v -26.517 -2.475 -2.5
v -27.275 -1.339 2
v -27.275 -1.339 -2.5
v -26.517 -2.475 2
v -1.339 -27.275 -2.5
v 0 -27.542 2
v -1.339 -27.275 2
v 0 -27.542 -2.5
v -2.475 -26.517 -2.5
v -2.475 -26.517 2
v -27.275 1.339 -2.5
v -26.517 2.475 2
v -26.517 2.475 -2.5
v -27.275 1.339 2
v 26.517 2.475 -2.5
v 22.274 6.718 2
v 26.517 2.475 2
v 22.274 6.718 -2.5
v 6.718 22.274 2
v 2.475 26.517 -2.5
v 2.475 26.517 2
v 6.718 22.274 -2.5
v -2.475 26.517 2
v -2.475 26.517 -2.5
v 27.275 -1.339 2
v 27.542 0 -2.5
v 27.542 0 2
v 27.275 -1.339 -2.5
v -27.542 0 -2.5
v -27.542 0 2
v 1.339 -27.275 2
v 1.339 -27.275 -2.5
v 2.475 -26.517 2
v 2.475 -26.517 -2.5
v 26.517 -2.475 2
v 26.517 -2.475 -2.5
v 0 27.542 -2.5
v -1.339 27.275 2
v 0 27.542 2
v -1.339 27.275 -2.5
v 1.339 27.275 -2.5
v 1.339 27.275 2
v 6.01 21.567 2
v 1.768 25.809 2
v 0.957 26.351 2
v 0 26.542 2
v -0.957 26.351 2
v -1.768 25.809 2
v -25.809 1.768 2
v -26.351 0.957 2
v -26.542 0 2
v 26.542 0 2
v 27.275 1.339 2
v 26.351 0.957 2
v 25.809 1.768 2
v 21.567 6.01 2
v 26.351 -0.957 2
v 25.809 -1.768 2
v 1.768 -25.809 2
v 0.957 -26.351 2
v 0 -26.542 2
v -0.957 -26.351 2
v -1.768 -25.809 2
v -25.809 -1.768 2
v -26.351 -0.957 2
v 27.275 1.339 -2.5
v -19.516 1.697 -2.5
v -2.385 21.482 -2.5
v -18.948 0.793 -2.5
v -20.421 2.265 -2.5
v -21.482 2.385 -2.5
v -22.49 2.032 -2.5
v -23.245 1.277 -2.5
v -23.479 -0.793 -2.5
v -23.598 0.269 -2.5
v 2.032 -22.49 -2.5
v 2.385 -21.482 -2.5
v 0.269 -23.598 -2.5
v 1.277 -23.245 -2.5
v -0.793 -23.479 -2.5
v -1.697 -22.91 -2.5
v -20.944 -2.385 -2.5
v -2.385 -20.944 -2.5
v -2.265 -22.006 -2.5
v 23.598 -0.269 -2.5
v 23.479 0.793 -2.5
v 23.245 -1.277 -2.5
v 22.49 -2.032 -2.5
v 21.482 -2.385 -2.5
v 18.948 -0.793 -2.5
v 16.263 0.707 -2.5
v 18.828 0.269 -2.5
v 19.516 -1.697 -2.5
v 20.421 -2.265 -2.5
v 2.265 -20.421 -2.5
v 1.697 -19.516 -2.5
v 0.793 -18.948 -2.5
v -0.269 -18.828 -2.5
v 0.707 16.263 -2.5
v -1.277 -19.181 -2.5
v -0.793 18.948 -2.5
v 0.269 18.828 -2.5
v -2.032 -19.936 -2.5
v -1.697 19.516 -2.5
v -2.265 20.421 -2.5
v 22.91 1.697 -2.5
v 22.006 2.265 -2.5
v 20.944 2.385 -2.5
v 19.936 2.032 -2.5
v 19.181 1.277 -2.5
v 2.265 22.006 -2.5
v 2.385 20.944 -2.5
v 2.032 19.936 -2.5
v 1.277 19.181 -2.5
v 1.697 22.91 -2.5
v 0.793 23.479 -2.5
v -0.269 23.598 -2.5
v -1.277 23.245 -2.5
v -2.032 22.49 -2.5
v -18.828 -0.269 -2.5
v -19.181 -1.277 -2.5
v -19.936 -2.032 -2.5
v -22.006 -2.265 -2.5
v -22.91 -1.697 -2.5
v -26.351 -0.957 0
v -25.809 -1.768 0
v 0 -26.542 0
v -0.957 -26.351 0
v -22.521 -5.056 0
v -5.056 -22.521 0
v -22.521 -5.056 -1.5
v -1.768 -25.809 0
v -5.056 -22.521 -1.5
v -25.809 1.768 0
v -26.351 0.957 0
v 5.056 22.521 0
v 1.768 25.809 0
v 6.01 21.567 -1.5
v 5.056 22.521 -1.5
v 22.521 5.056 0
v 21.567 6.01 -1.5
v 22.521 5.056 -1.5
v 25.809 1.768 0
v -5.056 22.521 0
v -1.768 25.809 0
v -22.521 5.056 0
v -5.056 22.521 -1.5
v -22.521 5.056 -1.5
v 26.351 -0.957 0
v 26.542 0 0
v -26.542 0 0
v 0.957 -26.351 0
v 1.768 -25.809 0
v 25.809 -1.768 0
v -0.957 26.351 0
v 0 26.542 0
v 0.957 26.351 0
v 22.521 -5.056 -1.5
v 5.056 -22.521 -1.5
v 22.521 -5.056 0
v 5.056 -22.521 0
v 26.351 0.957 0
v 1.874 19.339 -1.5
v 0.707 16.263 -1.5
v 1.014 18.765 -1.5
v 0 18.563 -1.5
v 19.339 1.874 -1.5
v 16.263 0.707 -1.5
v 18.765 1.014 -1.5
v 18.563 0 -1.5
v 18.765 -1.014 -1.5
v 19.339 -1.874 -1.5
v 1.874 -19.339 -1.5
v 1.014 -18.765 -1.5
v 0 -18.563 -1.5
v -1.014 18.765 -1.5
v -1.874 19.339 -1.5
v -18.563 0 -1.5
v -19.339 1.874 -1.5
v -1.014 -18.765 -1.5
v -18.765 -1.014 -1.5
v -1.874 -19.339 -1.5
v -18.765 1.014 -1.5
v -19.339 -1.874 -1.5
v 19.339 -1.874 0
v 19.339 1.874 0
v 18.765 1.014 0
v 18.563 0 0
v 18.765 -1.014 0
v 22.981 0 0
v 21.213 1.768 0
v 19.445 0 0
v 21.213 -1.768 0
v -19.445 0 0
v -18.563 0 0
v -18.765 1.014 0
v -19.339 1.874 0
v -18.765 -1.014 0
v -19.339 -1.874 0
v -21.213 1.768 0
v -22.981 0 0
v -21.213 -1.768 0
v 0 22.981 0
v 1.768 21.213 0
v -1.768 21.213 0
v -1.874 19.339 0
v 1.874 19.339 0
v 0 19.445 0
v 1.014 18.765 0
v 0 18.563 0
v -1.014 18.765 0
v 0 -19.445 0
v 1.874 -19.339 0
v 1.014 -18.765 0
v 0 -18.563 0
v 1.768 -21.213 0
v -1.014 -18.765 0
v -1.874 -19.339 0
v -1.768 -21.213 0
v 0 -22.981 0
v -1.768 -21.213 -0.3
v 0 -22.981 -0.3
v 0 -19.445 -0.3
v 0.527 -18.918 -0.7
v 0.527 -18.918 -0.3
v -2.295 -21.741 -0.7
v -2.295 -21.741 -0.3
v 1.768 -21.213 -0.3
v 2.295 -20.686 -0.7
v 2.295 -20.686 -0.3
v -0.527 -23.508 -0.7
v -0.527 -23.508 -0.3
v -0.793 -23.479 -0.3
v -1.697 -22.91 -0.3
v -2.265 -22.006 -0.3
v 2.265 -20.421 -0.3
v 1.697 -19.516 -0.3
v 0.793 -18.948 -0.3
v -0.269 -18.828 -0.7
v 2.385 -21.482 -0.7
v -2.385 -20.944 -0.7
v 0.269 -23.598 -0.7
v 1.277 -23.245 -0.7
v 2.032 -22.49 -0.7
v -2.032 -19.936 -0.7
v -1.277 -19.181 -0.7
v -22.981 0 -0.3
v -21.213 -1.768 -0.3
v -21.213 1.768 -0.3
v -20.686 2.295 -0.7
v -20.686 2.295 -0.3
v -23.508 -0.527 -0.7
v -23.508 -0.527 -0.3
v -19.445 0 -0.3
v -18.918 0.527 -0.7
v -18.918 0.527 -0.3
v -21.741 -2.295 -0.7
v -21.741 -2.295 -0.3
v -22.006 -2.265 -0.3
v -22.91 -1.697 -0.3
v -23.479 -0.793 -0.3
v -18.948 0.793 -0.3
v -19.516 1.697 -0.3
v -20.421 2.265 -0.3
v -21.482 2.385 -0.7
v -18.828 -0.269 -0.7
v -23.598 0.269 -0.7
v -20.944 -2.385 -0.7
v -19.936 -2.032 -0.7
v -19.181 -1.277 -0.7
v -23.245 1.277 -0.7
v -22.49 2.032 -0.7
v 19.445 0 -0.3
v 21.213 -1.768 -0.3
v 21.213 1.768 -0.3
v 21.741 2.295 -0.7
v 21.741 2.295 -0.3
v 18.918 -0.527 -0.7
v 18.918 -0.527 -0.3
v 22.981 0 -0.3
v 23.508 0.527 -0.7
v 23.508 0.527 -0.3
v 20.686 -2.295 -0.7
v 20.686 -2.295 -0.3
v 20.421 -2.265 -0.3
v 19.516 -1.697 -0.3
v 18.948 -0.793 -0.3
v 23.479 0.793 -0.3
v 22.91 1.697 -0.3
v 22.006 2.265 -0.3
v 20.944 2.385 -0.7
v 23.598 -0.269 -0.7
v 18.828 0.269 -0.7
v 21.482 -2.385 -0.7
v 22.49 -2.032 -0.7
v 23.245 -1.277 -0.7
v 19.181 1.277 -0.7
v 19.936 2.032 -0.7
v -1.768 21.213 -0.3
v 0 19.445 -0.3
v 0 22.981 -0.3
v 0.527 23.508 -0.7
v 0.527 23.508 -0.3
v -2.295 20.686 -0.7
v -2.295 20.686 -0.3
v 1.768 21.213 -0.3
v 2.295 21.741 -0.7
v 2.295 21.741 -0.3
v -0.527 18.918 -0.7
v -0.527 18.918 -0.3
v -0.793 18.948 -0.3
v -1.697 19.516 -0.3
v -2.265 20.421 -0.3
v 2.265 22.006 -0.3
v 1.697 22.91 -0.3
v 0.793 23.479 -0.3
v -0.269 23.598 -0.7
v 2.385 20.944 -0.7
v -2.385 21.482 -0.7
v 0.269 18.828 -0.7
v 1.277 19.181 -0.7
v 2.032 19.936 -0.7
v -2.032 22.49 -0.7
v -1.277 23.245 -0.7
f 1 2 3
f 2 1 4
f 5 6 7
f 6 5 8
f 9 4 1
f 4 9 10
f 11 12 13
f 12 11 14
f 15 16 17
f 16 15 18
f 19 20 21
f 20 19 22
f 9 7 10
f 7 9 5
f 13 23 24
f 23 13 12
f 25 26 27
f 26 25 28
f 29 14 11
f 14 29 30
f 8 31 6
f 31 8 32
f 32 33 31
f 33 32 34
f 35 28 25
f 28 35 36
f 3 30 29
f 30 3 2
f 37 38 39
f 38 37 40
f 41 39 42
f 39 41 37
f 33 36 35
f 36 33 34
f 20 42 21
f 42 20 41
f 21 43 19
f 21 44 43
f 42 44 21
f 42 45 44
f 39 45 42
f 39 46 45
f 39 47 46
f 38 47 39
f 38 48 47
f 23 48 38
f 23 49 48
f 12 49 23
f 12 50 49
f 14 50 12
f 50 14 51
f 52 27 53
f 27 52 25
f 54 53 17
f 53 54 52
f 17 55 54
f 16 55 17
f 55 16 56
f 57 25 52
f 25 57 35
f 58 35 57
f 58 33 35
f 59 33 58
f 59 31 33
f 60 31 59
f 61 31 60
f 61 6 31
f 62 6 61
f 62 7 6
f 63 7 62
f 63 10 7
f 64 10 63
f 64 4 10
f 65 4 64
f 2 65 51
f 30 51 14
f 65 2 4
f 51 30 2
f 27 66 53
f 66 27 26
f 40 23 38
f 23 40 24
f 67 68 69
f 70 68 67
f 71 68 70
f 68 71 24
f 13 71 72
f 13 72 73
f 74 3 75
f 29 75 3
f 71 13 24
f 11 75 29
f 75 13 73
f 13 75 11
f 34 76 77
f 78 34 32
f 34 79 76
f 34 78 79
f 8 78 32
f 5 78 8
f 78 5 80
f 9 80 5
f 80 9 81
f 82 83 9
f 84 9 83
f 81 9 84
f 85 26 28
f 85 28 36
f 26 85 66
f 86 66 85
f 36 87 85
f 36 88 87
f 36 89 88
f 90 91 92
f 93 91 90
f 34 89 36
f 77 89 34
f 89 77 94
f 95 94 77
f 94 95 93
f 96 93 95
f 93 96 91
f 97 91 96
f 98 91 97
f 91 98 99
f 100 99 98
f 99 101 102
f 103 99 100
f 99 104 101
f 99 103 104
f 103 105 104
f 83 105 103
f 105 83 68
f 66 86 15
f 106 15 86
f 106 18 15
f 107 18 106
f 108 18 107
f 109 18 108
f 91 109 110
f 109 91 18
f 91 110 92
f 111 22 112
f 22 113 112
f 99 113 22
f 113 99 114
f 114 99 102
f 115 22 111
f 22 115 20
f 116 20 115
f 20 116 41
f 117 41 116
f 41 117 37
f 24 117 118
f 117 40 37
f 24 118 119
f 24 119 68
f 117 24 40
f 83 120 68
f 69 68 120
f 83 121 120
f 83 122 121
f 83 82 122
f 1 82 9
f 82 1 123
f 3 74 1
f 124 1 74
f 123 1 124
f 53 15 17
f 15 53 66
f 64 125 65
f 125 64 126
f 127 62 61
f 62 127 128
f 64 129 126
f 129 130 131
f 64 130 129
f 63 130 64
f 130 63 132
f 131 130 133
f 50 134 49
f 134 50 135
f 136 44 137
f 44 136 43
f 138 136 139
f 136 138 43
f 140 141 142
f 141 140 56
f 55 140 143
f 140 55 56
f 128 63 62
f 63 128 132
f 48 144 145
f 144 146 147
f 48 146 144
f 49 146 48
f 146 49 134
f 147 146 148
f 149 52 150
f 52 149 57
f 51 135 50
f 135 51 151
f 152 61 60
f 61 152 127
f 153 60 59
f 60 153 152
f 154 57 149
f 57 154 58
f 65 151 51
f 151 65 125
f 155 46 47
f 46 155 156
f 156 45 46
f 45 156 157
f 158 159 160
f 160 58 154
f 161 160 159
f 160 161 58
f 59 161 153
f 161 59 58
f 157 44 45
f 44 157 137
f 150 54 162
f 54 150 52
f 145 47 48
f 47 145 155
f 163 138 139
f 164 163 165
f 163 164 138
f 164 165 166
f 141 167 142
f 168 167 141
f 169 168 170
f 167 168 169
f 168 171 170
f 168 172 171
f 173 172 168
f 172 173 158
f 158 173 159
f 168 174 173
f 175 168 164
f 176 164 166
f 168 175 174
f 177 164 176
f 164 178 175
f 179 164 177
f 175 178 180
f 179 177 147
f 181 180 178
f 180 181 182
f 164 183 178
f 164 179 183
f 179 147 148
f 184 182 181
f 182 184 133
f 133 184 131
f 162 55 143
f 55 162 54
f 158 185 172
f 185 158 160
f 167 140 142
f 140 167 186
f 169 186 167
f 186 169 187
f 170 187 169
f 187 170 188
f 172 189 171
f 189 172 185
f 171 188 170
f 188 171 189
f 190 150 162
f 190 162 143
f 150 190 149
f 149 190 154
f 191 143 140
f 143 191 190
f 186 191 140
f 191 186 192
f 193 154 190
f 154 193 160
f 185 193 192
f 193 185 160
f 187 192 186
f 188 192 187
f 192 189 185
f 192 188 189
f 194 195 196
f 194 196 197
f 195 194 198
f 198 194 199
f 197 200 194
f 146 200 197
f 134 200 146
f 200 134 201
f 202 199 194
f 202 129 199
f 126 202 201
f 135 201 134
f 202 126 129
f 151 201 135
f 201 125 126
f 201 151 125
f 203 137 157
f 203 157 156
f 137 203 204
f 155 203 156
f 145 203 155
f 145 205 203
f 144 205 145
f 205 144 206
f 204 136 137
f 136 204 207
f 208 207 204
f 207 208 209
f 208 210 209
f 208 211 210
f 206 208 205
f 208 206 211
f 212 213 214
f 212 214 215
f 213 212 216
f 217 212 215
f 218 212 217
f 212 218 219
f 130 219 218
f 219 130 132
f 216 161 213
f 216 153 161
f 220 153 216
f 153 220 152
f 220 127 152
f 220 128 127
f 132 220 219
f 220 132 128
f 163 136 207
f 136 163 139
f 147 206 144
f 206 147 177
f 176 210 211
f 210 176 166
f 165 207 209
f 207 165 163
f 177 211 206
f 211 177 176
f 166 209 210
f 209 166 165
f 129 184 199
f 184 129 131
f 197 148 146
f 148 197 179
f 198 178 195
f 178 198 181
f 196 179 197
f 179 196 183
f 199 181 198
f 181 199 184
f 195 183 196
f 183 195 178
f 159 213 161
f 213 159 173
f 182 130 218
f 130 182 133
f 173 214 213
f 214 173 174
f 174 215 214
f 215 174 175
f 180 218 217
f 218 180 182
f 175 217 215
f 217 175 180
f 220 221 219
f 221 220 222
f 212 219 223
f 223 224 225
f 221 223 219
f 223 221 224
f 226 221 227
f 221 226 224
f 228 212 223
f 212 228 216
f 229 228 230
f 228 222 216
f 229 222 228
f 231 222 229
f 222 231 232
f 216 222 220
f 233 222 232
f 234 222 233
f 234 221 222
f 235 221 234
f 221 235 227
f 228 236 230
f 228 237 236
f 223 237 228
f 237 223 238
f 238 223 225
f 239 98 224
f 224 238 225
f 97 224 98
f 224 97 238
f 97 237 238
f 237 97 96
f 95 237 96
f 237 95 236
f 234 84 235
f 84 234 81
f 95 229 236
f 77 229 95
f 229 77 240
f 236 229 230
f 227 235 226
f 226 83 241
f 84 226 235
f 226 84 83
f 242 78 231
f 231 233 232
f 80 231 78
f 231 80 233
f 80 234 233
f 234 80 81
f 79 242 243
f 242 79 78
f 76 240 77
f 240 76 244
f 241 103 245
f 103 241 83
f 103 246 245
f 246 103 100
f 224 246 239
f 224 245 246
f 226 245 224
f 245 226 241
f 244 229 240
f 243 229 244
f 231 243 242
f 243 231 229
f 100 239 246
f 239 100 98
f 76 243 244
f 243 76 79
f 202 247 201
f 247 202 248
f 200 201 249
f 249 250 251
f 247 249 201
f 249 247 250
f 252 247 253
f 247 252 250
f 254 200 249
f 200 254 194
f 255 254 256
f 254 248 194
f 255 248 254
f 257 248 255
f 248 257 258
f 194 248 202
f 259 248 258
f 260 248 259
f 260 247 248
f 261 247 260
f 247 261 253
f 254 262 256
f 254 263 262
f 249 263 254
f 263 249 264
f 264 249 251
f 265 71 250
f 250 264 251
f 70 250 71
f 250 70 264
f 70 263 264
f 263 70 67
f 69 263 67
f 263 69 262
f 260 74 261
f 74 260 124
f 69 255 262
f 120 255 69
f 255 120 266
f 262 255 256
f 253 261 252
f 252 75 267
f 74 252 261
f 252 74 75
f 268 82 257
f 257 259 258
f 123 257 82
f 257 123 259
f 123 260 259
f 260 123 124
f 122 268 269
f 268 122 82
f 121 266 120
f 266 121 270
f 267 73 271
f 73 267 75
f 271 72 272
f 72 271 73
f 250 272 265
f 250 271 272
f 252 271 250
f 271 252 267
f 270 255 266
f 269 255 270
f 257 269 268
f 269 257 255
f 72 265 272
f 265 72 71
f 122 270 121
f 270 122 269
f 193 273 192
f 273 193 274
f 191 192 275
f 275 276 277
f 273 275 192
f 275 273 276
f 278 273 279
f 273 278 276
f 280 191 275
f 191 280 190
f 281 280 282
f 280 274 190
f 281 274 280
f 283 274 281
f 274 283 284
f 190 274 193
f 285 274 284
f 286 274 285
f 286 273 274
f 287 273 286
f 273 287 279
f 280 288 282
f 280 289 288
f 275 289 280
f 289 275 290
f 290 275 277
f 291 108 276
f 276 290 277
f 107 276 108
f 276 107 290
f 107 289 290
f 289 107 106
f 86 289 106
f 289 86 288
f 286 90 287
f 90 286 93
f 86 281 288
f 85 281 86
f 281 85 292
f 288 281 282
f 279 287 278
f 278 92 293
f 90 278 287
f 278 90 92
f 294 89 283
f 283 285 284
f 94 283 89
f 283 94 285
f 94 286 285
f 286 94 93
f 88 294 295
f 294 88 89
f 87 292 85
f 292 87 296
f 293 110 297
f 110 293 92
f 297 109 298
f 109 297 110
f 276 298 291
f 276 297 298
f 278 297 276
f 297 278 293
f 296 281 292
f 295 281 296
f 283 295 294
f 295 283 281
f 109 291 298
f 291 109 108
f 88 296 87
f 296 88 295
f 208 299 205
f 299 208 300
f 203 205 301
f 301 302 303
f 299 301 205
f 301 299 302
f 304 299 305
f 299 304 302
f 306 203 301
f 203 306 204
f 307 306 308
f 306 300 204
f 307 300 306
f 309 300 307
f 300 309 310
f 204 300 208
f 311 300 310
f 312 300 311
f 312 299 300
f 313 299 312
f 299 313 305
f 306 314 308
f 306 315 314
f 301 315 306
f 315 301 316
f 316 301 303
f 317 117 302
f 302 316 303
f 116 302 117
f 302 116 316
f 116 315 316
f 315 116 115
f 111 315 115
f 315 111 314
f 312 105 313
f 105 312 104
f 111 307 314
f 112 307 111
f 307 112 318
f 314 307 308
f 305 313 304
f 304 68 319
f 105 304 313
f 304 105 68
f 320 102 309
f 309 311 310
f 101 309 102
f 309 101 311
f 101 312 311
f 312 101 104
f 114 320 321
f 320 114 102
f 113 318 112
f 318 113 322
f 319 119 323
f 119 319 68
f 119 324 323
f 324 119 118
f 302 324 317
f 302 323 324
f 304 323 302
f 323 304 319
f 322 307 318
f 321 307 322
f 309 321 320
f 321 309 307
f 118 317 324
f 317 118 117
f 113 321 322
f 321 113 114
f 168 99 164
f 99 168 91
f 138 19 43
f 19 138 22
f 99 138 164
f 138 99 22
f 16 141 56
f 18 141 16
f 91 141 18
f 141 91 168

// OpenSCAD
// file: libs/libdict.scad
// This library add dictionary like features to openscad
// the dictionary is a list of pairs as we cannot define new types.
// Unlike a python dictionary we cannot do a proper hash table for speed
// so everything is build around the OpenSCAD search function
// There are a lot of assert statements to ensure data in the "dictionary"
// is in the format of
// * A list of lists
// * Each internal list has a length of two
// * First element of each internal list is a string (the key)
// * All keys are unique.


// Private function:
// This function returns true if the value is in the list
// value must be a string.
// No error checking, for use by is_in only!
function _is_in_str(value, list) =
    search([value], list) != [[]];

// Private function:
// This function returns true if the value is in the list
// value must be a number.
// No error checking, for use by is_in only!
function _is_in_num(value, list) =
    search(value, list) != [];


// This function returns true if the value is in the list
// value must be a string or a number.
function is_in(value, list) =
    assert(is_num(value) || is_string(value) , "is_in: value must be a number or string")
    assert(is_list(list), "is_in: list must be a list")
    is_num(value) ? _is_in_num(value, list) : _is_in_str(value, list);

/**
 * Sum a list
 * This recursive function sums a list.  It should be called with one
 * argument (the list); the other two arguments simply allow it to be
 * "tail-recursive" which lets OpenSCAD optimise it better.  This is
 * very close to the example given in the OpenSCAD docs.
 */
function _libdict_sum_list(list, starting_element=0, running_total=0) =
    starting_element >= len(list) ?
        running_total :
        _libdict_sum_list(list, starting_element + 1, running_total + list[starting_element]);

/**
 * When checking a list for uniqueness, we can get "errant matches".
 * An errant match is when a non-list matches with the first element in a list.
 * i.e. it would consider [1, [1,0]] to be non-unique. We cannot know which 
 * element is the non-list but we do know that it is errant if exactly one 
 * of them is not a list.
 * If two elements are non-lists, they must be identical in order to have matched.  
 * Similarly, if all elements are lists, they must be identical because ``search`` 
 * will have matched them as whole lists.
 * The argument "list" is the list we are checking for uniqueness, and "match" is 
 * a vector of indices that have been returned by ``search``.
 */
function _check_errant_match(list, match) = let(
    non_list = [for (m = match) is_list(list[m])? 0 : 1],
    number_of_non_lists = _libdict_sum_list(non_list)
) number_of_non_lists == 1 ? 0 : 1;

// Returns true if all emements in list are unique.
function is_unique(list) =
    assert(is_list(list), "is_unique: list must be a list")
    let(
        matches = search(list, list, 0),
        // Assign 1 or 0 depending on is the match length for each element
        // return wether any matches are greater than one (mathcing more than
        // itself)
        // note cannot search for true or false so using 1 and zero
        bool_list = [for (match = matches) if (len(match)==1) 0
            // should put a 1 here to show they matched but in the case of
            // [1, [1]] it will match both, so need to check if they are
            // both lists or both not list
            else _check_errant_match(list, match)]
    ) !is_in(1, bool_list);

// Private function:
// Checks that the input is a list and that every element is a list
// of length 2.
// No error checking, for use by valid_dict only!
function _is_pairs(list) =
    !is_list(list) ? false :
        !is_in(0, [for (pair = list) is_list(pair) && len(pair)==2 ? 1: 0]);

// Private function:
// Checks all elements in the list are strings
// No error checking, for use by valid_dict only!
// Strings can't be empty
function _is_list_of_strings(list) =
    !is_in(0, [for (item = list) is_string(item) && len(item)>0 ? 1: 0]);

// Private function:
// Returns the keus in a dictionary
// No error checking, for use by valid_dict only!
function _keylist(dict)  = [for (pair=dict) pair[0]];

function valid_dict(dict) =
    //if the input are not pairs return instantly
    !_is_pairs(dict) ? false : let (
        //if they are pairs get all keys
        keys = _keylist(dict),
        all_strings =  _is_list_of_strings(keys),
        unique = is_unique(keys)
    ) (all_strings && unique) ? true : false;

// Key lookup for key value pair "dictionary".
// Unlike the built in lookup this works with strings.
function key_lookup(key, dict) =
    assert(is_string(key), "`key` must be a string")
    assert(valid_dict(dict), "`dict` must be a valid 'dictionary'")
    let(
        // key is in [] because otherwise openscad will search for each letter rather than the string.
        index = search([key], dict, 1, 0)[0]
    )  assert (index!=[], "Key lookup failed, key not found!") dict[index][1];

// Creates a new dictionary with a key value pair replaced. Pair must already
// be in dictionary.
function replace_value(key, value, dict) =
    assert(is_string(key), "`key` must be a string")
    assert(valid_dict(dict), "`dict` must be a valid 'dictionary'")
    assert(is_in(key, _keylist(dict)), "`key` not found in dictionary!")
    [for (kv_pair = dict) key!=kv_pair[0] ? kv_pair : [key, value]];


// Creates a new dictionary with a a set of key value pair replaced
// both inputs must be a dictionary. All keys in input must already be
// in dictionary
function replace_multiple_values(rep_dict, dict) =
    assert(valid_dict(rep_dict), "`rep dict` must be a valid 'dictionary'")
    assert(valid_dict(dict), "`dict` must be a valid 'dictionary'")
    let(
        // loop over all keys in replacement dict checking they are in the original
        rep_keys = [for (key = _keylist(rep_dict))
            assert(is_in(key, _keylist(dict)), "`key` not found in dictionary!")
            key
        ]
    ) //Finally return the updated dictionary using this long list comprehension.
    [
        for (kv_pair = dict) let(
            key = kv_pair[0],
            // check if this key is in the replacement dictionary and if so return index
            // key is in [] because otherwise openscad will search for each letter rather
            // than the string.
            index = search([key], rep_dict, 1, 0)[0]
            // if index is empty return original key value pair, else return the key with
            // the replaced value
        ) index == [] ? kv_pair : [key, rep_dict[index][1]]
    ];
// file: libs/cameras/picamera_hq.scad
use <../utilities.scad>
use <../libdict.scad>

function picamera_hq_camera_dict() = [["mount_height", 4.5],
                                     ["sensor_height", 1]]; //Height of the sensor above the PCB

function picamera_hq_bottom_z() = -key_lookup("mount_height", picamera_hq_camera_dict());

function picamera_hq_hole_spacing() = 30;

function picamera_board_size() = [38, 38];

module picamera_hq_cutout(beam_length=15){
    h = key_lookup("mount_height", picamera_hq_camera_dict())+tiny();
    translate_z(-tiny()){
        cylinder(d=5, h=beam_length);
        cylinder(d1=9.5+2*h, d2=9.5, h=h);
    }
}

module picamera_hq_board(h=tiny(), rotated=true, clearance=0){
    // a rounded rectangle with the dimensions of the picamera hq board
    // centred on the origin
    board_dims = picamera_board_size();
    roc = 2+clearance;
    angle = rotated ? 45 : 0;
    rotate_z(angle){
        linear_extrude(h){
            hull(){
                reflect([1,0]){
                    reflect([0,1]){
                        translation = board_dims/2 + [1, 1]*(-roc+clearance);
                        translate(translation){
                            circle(r=roc,$fn=16);
                        }
                    }
                }
            }
        }
    }
}

module picamera_hq_camera_mount(screwhole=true, counterbore=false){
    // A mount for the pi camera hq
    // This should finish at z=0+tiny(), with a surface that can be
    // hull-ed onto the lens assembly.
    board_dims = picamera_board_size();
    difference(){
        rotate(45){
            sequential_hull(){
                translate_z(picamera_hq_bottom_z()){
                    picamera_hq_board(h=tiny(), rotated=false);
                }
                translate_z(-1){
                    picamera_hq_board(h=tiny(), rotated=false);
                }
                x_size = board_dims.x-(-1.5-picamera_hq_bottom_z())*2;
                cube([x_size, board_dims.y, tiny()], center=true);
            }
        }
        rotate(45){
            translate_z(picamera_hq_bottom_z()){
                picamera_hq_cutout();
            }
        }
        if(counterbore){
            picamera_hq_counterbore();
        }
        if(screwhole){
            picamera_hq_screwholes();
        }
    }
}

module picamera_hq_screwholes(){
    //chamfered screw holes for mounting
    translate_z(picamera_hq_bottom_z()){
        at_picamera_hq_hole_pattern(){
            rotate_z(60){
                translate_z(-tiny()){
                    no2_selftap_hole(h=10);
                }
            }
        }
    }
}

module picamera_hq_counterbore(){
    translate_z(picamera_hq_bottom_z()-1){
        at_picamera_hq_hole_pattern(){
            cylinder(r=1.25, h=99, $fn=12);
        }
    }
    translate_z(picamera_hq_bottom_z()+1){
        at_picamera_hq_hole_pattern(){
            cylinder(r=2.8, h=99, $fn=12);
        }
    }
}

module picamera_hq_bottom_mounting_posts(optics_config, outers=true, cutouts=true, bottom_slice=false){
    // posts to mount to pi camera from below

    if (bottom_slice){
        //if we want the bottom slice intersect with the bottom of the whole
        //post found by recalling the function
        intersection(){
            cylinder(h=tiny(), r=99);
            picamera_hq_bottom_mounting_posts(optics_config, outers=outers, cutouts=cutouts);
        }
    }
    else{
        h=key_lookup("mounting_post_height", optics_config);
        r1=3;
        r2=2;
        at_picamera_hq_hole_pattern(){
            difference(){
                if(outers){
                    cylinder(r1=r1, r2=r2, h=h, $fn=12);
                }
                if(cutouts){
                    translate_z(h-6+tiny()){
                        no2_selftap_hole(h=6);
                    }
                }
            }
        }
    }
}

module at_picamera_hq_hole_pattern(){
    // posts to mount to pi camera from below
    hole_spacing = picamera_hq_hole_spacing();
    rotate(45){
        for(x_tr=[-.5, .5]*hole_spacing){
            for(y_tr=[-.5, .5]*hole_spacing){
                translate([x_tr, y_tr, 0]){
                    children();
                }
            }
        }
    }
}


module picamera_hq_cover_pads(clearance=1){
    //create the pads that make contact with the board
    hole_spacing = picamera_hq_hole_spacing();

    intersection(){
        // use loop to make all 4
        for (angle = [0, 90, 180, 270]){
            rotate(angle){
                translate_x(hole_spacing/2*sqrt(2)){
                    hull(){
                        // cylinder centred on a mounting hole
                        cylinder(d=5.3, h=1.5);
                        // Translate cylinders perpendicular to boards edge
                        // and hull to make a pad that sticks out beyond the board
                        // This will be intersected with the board shape later
                        translate([10,10,0]){
                            cylinder(d=5.3, h=1.5);
                        }
                        translate([10,-10,0]){
                            cylinder(d=5.3, h=1.5);
                        }
                    }
                }
            }
        }
        picamera_hq_board(h=2, clearance=clearance);
    }
}


/////////// Cover for camera board //////////////
module picamera_hq_cover(){
    $fn=16;
    difference(){
        union(){
            translate_z(-2){
                difference(){
                    picamera_hq_board(h=4.5, clearance=1.5);
                    translate_z(-tiny()){
                        picamera_hq_board(h=3.5+tiny(), clearance=.5);
                    }
                }
            }
            picamera_hq_cover_pads(clearance=1);
        }
        at_picamera_hq_hole_pattern(){
            translate_z(.8){
                // mirror z as well as z_flip as these holes need to be printed
                // so they can beidge, but the part is printed upside down
                mirror([0,0,1]){
                    no2_selftap_counterbore(flip_z=true, tight=true);
                }
            }
        }
        rotate_z(45){
            translate_x(picamera_board_size().x/2){
                cube([14, 22, 30], center=true);
            }
        }
    }
}
// main file
use <./libs/cameras/picamera_hq.scad>

mirror([0,0,1]){
    picamera_hq_cover();
}
